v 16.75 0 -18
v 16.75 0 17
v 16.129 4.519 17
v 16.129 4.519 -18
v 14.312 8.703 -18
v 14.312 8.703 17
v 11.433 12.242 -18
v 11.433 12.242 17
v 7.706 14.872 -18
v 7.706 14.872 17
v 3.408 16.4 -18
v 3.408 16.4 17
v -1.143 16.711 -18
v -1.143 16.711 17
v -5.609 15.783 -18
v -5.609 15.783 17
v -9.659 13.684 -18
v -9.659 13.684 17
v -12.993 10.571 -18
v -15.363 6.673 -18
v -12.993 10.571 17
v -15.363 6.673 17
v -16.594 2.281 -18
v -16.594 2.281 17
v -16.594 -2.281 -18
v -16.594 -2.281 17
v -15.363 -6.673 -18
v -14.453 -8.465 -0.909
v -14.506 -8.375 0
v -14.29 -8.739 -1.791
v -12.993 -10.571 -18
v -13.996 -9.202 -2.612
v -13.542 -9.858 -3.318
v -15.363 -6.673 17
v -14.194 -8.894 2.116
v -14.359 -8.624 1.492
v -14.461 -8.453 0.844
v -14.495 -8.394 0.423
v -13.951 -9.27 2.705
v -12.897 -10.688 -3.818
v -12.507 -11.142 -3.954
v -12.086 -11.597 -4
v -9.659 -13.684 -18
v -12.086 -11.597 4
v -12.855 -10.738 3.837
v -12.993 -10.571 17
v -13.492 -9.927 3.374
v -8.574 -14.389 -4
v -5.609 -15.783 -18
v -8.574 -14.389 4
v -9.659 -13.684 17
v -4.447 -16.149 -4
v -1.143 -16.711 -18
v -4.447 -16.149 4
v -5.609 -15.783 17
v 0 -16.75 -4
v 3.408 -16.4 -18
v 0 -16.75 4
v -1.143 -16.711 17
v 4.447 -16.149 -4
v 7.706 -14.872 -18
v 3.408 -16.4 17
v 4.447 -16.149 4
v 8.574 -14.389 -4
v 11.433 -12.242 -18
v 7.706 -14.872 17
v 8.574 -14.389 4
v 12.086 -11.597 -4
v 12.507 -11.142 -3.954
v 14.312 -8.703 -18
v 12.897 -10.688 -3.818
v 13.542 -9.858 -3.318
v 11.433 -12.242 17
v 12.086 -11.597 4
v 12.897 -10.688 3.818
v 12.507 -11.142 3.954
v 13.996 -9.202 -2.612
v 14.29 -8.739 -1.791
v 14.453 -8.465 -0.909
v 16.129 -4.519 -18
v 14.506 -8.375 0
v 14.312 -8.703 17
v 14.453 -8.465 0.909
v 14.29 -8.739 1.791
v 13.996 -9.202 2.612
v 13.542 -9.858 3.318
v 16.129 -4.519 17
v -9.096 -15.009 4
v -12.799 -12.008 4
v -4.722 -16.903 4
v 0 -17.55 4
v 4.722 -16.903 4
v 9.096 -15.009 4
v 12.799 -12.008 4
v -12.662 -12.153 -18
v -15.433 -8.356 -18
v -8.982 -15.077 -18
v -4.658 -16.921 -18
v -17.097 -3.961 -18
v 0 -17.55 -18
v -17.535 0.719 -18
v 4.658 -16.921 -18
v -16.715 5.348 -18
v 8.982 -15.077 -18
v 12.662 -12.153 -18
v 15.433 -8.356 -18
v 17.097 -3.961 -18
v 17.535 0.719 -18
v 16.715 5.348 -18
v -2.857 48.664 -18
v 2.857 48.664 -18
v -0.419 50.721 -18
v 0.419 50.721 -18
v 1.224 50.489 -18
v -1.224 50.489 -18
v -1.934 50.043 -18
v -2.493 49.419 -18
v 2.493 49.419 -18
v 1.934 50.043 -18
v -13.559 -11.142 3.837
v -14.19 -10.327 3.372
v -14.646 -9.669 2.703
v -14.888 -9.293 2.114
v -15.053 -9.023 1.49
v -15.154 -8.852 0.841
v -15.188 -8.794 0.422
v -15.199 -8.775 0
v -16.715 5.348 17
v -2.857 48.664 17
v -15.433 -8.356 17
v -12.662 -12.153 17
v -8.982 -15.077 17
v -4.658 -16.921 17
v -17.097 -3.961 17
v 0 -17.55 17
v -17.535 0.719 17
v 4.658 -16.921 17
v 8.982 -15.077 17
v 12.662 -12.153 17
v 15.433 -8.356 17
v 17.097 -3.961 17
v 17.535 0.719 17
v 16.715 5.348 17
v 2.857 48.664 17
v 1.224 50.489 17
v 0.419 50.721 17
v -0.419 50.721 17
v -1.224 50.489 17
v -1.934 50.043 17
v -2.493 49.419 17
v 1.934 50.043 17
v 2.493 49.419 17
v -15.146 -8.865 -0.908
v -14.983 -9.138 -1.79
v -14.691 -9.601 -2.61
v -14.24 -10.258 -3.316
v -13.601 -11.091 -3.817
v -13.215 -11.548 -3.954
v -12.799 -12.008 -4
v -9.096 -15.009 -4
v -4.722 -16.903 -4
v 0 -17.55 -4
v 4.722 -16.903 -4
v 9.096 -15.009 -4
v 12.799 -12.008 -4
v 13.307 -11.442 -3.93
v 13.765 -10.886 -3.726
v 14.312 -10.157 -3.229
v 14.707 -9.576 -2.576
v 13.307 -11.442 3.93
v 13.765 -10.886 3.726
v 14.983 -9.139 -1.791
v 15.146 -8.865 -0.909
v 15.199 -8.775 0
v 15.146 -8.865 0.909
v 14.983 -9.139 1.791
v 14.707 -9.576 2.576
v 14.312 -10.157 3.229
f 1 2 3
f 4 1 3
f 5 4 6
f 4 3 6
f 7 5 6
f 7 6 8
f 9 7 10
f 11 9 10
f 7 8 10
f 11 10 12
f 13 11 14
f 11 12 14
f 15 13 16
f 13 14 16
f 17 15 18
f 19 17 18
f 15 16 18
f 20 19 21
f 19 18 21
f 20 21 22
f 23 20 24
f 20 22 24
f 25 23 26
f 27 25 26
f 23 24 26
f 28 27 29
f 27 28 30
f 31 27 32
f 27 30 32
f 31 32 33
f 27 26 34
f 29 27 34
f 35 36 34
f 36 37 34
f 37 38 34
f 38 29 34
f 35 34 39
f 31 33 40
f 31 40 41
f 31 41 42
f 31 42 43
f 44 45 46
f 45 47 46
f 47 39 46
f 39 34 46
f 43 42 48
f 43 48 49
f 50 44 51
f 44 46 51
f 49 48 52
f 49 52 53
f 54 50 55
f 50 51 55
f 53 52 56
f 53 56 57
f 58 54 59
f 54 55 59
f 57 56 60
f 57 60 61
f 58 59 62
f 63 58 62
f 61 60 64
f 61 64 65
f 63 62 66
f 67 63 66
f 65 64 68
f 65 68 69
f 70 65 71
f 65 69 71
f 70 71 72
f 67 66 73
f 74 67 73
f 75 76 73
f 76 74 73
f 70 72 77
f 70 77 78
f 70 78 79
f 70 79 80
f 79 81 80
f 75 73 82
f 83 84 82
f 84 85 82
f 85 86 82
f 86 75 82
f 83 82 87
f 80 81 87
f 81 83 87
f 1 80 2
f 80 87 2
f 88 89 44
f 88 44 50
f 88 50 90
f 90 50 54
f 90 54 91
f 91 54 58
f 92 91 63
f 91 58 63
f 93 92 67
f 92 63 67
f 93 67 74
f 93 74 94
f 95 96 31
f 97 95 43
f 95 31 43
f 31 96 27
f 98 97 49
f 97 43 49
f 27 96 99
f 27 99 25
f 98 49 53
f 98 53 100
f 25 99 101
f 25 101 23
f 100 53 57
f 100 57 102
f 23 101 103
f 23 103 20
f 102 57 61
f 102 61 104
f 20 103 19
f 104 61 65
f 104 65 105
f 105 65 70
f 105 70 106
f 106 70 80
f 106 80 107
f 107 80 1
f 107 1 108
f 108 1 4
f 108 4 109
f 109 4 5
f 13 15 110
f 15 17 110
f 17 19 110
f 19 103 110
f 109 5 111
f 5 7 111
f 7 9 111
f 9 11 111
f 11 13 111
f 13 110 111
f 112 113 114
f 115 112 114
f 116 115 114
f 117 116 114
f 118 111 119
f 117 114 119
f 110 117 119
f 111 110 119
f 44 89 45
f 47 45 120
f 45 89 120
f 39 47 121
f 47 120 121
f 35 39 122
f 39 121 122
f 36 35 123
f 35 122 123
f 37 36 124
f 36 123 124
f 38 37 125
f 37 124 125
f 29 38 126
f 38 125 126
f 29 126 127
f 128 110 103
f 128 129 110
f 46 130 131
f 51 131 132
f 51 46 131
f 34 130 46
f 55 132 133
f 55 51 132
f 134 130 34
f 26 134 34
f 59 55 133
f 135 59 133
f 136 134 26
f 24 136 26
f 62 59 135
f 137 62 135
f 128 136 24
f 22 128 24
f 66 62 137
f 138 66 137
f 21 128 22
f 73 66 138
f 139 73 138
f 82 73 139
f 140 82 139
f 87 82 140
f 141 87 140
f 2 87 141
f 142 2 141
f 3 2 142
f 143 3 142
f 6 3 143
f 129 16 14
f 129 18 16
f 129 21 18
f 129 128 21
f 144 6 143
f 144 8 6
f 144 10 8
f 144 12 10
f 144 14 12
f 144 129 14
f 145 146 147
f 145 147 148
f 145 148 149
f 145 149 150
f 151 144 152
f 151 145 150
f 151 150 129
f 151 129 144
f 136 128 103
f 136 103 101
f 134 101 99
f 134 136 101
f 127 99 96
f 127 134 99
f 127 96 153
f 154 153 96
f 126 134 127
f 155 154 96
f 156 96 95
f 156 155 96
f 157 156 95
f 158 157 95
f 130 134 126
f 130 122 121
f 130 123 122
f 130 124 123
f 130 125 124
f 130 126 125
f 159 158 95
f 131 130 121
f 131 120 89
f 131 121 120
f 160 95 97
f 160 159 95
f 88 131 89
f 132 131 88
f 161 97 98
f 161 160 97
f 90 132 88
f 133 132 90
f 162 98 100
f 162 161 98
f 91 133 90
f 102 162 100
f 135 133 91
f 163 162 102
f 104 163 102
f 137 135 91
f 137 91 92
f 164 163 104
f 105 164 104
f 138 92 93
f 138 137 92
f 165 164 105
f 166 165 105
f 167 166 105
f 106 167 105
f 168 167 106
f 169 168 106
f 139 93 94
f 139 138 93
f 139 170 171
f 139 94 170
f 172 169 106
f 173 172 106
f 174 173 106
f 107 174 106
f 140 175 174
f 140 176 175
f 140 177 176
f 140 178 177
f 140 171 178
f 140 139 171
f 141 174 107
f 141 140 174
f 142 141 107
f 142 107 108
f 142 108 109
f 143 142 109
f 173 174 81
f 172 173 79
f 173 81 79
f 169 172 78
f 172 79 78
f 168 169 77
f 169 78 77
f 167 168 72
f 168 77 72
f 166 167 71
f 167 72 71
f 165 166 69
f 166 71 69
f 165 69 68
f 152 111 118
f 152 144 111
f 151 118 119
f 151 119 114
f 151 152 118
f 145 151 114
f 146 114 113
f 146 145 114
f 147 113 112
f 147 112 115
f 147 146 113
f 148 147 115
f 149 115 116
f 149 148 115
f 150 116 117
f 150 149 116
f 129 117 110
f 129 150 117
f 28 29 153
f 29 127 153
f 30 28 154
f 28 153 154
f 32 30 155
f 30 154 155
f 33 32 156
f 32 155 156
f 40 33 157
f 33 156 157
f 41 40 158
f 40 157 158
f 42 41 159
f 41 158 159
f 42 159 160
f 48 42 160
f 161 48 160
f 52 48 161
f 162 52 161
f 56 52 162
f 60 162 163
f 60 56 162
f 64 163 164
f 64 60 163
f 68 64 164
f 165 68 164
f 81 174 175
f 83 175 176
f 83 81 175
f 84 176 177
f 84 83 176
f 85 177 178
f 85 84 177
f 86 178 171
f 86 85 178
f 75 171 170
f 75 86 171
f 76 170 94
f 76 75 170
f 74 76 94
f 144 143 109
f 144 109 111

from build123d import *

# Parameters (mm, degrees)
F0_R          = 16.75
F1_DEPTH      = 17
F1_DEPTH_BACK = 18
F3_DEPTH      = 4
F3_DEPTH_BACK = 4
F4_R          = 3.99999


# Not quite as in the source:
# - a fillet or chamfer is up to 0.001 mm smaller than in the source, because OpenCascade refuses the exact size
# - a feature of the source that left no trace in its solid (it failed there, or was rolled back) is left out


with BuildPart() as f1:
    # F0 (on Top) → F1 (new body, two sides)
    with BuildSketch(Plane.XY) as f1_sk:
        with BuildLine():
            Line((-2.8573335724, 48.6641361257), (-16.7154013983, 5.3476963351))
            ThreePointArc((-16.7154013983, 5.3476963351), (0, -17.55), (16.7154013983, 5.3476963351))
            Line((16.7154013983, 5.3476963351), (2.8573335724, 48.6641361257))
            ThreePointArc((2.8573335724, 48.6641361257), (0, 50.75), (-2.8573335724, 48.6641361257))
        make_face()
        Circle(F0_R, mode=Mode.SUBTRACT)
    extrude(amount=F1_DEPTH)
    extrude(f1_sk.sketch, amount=-F1_DEPTH_BACK)

    # F2 (on Top) → F3 (cut, two sides)
    with BuildSketch(Plane.XY) as f3_sk:
        with BuildLine():
            Line((15.1987458364, -8.775), (0, 0))
            Line((0, 0), (-15.1987458364, -8.775))
            ThreePointArc((-15.1987458364, -8.775), (0, -17.55), (15.1987458364, -8.775))
        make_face()
    extrude(amount=F3_DEPTH, mode=Mode.SUBTRACT)
    extrude(f3_sk.sketch, amount=-F3_DEPTH_BACK, mode=Mode.SUBTRACT)

    # F4 (radius 4 in the source; OpenCascade refuses exactly that, so slightly less here)
    f4_edges = [f1.edges().sort_by_distance(p)[0] for p in [
        (-14.852336, -8.575, 4),
        (-14.852336, -8.575, -4),
        (14.852336, -8.575, -4),
        (14.852336, -8.575, 4),
    ]]
    fillet(f4_edges, radius=F4_R)


solid = f1.part
